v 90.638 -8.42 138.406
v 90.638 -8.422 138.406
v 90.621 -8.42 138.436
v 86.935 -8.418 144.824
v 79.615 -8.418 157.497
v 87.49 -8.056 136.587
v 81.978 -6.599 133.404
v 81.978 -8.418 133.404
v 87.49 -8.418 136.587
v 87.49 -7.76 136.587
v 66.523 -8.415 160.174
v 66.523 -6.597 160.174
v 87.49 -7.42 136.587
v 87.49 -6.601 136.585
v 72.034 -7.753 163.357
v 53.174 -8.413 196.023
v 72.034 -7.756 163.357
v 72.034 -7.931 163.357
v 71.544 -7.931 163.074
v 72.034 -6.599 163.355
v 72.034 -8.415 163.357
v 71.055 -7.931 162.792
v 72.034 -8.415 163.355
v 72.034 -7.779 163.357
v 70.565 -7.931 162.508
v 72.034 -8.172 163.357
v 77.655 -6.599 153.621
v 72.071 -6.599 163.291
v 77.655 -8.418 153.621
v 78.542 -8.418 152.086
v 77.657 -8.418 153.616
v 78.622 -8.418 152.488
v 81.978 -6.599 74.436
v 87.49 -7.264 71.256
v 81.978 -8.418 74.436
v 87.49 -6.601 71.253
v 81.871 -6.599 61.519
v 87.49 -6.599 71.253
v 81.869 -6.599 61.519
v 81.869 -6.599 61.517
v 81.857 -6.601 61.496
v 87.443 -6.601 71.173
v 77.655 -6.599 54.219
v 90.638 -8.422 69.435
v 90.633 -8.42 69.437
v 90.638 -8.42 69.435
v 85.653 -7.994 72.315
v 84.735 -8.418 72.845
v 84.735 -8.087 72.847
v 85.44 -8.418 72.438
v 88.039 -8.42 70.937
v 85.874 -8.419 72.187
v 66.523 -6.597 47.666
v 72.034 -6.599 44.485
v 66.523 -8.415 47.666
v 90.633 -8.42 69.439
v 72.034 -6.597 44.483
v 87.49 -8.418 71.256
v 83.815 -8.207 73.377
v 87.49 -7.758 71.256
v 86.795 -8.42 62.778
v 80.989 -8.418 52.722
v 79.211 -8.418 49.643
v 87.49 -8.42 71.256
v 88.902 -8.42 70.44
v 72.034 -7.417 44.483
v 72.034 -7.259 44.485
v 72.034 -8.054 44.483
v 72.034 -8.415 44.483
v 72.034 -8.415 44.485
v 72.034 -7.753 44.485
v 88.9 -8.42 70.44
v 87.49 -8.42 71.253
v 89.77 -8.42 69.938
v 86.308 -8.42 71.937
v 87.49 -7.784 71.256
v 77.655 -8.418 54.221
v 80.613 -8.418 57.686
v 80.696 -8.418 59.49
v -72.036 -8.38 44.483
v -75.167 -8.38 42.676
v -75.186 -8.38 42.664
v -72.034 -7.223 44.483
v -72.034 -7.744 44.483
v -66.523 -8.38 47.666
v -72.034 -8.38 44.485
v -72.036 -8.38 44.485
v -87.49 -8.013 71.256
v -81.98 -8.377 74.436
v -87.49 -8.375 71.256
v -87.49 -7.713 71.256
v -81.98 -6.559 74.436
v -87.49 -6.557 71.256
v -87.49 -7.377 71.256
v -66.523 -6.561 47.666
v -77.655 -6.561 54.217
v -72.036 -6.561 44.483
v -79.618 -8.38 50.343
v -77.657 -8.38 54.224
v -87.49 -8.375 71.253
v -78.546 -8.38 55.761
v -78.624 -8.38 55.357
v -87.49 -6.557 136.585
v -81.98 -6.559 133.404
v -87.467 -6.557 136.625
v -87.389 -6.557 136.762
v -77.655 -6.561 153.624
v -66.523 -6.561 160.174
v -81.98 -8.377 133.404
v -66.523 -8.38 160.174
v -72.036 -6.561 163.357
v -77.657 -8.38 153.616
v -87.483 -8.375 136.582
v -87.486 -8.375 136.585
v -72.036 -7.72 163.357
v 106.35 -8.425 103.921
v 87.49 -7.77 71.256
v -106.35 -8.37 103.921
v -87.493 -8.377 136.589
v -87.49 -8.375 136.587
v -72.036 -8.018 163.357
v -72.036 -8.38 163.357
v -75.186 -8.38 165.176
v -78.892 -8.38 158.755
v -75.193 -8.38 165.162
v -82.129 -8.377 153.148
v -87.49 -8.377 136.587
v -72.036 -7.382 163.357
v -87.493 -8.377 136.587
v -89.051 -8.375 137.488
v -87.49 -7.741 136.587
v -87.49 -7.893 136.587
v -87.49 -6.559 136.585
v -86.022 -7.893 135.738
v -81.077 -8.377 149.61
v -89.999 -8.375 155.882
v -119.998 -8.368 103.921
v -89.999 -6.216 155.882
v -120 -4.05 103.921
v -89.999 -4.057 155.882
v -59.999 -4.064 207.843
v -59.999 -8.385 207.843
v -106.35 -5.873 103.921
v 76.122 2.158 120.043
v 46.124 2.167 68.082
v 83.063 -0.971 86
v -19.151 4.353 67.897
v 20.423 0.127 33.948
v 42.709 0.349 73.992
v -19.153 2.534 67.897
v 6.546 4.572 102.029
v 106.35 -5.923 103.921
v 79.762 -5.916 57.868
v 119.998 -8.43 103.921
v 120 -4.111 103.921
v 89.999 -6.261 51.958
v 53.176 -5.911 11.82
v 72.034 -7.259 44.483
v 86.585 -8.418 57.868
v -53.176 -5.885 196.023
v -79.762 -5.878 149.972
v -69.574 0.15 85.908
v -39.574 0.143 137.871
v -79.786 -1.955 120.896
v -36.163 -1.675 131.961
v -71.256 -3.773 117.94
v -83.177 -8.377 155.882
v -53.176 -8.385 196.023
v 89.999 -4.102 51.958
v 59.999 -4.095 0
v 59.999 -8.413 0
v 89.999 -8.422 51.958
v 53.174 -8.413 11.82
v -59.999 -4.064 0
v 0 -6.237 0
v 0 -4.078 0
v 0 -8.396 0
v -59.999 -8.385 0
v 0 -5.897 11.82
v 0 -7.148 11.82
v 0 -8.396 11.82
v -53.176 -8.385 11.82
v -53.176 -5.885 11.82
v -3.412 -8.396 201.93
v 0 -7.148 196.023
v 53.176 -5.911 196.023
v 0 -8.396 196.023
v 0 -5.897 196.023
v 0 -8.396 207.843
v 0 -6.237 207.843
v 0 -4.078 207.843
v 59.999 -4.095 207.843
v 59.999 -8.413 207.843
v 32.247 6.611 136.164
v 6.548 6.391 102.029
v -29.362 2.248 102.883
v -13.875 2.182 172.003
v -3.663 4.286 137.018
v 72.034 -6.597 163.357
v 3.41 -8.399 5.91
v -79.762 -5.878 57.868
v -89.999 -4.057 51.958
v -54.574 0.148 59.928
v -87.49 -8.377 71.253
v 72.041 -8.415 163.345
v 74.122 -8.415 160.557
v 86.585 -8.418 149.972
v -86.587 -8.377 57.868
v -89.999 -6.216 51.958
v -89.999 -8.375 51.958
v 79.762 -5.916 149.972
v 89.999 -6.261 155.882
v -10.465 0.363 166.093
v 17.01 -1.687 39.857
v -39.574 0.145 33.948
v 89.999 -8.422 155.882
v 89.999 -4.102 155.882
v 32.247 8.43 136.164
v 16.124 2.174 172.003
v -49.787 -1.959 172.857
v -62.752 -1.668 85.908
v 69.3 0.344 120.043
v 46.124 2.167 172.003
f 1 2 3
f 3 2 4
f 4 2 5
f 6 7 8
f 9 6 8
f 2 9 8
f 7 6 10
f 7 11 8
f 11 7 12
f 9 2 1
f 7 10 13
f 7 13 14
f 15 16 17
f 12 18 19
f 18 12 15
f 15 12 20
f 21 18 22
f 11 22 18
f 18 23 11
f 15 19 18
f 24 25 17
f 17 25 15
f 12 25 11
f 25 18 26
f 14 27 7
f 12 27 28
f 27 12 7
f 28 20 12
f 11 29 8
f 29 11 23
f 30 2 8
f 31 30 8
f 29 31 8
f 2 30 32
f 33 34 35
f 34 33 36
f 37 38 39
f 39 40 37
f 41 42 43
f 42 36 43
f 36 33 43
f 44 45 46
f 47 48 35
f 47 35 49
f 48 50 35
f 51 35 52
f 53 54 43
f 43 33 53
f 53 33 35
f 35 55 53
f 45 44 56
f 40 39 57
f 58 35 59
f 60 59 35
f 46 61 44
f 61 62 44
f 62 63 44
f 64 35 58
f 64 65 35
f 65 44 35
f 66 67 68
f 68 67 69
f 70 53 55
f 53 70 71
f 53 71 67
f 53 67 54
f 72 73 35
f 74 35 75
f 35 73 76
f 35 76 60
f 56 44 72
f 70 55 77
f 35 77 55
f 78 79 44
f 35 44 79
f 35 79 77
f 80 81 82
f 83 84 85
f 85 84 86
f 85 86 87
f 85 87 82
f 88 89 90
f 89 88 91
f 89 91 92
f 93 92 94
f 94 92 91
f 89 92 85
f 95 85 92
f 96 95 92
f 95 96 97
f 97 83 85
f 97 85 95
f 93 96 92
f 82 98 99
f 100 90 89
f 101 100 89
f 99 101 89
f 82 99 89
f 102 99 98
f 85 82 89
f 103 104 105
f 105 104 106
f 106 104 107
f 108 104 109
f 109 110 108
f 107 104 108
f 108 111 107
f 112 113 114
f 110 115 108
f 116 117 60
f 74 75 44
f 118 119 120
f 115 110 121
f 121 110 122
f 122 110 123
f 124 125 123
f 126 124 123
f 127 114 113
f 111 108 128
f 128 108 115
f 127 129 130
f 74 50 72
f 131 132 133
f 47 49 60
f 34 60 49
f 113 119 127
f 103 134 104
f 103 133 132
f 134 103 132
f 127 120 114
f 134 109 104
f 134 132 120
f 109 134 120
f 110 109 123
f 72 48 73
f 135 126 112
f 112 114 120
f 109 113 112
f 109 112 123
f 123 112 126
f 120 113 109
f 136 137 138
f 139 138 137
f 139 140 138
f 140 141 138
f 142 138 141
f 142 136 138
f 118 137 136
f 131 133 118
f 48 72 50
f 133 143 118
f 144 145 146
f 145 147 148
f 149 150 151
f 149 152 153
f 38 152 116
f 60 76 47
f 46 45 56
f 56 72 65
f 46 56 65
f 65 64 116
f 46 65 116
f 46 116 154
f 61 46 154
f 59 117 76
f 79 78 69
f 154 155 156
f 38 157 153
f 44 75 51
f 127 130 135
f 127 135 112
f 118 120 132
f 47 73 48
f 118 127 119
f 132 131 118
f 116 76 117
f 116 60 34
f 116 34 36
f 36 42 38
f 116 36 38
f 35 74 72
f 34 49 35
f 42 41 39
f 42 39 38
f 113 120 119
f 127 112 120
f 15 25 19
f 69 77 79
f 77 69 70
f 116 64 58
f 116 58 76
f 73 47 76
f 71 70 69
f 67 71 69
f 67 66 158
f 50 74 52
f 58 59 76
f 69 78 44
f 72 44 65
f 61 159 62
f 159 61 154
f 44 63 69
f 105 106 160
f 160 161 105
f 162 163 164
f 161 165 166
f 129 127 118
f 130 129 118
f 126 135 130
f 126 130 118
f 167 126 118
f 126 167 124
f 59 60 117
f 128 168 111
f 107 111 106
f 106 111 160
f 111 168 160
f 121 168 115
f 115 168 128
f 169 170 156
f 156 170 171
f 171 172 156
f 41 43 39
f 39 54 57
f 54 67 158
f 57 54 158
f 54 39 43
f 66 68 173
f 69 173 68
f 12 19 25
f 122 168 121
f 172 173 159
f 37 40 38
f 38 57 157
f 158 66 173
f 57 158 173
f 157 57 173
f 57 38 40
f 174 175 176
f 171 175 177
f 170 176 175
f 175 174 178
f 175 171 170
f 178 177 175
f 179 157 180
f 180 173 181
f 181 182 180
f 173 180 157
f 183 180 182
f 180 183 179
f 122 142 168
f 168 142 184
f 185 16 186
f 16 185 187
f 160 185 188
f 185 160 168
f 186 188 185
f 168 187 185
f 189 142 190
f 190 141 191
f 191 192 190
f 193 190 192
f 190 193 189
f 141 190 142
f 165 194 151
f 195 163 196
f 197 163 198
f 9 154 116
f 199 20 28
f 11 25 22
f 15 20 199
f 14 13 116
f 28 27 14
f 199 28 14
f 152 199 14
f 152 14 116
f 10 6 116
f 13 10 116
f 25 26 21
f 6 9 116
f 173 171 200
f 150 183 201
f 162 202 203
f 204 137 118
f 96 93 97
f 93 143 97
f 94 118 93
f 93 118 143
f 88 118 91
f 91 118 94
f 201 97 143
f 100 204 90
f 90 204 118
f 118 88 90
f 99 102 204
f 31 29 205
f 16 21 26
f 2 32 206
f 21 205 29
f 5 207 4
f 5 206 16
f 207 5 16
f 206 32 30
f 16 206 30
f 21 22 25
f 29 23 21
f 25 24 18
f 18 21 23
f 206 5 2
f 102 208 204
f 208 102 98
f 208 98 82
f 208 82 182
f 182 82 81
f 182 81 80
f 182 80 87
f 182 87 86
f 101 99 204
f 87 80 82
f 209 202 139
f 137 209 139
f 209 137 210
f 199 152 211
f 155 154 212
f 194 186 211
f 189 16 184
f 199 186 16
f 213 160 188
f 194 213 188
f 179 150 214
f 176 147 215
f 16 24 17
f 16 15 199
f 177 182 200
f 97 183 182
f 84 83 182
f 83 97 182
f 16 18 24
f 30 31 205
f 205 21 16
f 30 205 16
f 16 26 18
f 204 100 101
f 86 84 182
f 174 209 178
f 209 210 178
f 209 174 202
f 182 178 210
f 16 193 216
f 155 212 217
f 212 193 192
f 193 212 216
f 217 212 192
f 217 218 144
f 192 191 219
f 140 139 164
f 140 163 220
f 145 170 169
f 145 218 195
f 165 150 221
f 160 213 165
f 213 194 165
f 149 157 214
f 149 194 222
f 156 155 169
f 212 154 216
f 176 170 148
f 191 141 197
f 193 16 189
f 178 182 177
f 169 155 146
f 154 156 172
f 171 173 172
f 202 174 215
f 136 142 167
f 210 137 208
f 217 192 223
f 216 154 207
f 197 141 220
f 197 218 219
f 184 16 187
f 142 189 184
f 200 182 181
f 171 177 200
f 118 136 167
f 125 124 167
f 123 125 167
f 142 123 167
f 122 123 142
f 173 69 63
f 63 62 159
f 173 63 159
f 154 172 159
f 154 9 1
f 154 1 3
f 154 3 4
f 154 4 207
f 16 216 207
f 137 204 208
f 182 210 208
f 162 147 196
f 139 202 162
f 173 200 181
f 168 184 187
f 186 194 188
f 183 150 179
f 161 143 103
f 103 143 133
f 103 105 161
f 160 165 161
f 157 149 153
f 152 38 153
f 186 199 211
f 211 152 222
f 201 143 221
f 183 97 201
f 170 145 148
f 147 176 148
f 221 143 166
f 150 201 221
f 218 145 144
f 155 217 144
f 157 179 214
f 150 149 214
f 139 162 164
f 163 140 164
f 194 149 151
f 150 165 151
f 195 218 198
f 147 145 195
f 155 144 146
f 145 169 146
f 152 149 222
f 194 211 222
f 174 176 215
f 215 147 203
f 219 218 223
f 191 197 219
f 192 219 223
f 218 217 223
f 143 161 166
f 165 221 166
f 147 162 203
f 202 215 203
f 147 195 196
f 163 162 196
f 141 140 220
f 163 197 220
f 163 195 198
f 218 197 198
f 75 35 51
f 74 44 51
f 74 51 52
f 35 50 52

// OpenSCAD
/*
    Hexagon-Rev-v42-organized-parametric.scad
    -----------------------------------------
    Standalone OpenSCAD model reconstructed from Hexagon-Rev.stl.

    IMPORTANT
    =========
    This file contains the complete geometry internally as a polyhedron.
    No external STL is required.

    The original shape is preserved exactly. The controls below expose all
    transformations that can be changed safely without rebuilding the mesh.

    Because the source is an embedded mesh, geometry-specific features such as
    shell thickness, facet positions, or mounting-tab dimensions are NOT
    independently editable in this version. Those features are baked into the
    source geometry.

    Recommended default:
        units            = "mm";
        size_reference   = "width";
        target_size      = 240.0;
        output_orientation = "vertical";

    Export:
        F6 Render
        File -> Export -> Export as STL
*/


// =============================================================================
// CUSTOMIZER
// =============================================================================


/* [1 - Model Size] */

// Units used for target_size.
units = "mm";                         // [mm, in]

// Which overall source dimension target_size controls.
//
// width  = X dimension when vertical
// height = Z dimension when vertical
// depth  = Y relief/depth dimension
size_reference = "width";             // [width, height, depth]

// Desired overall dimension in the selected units.
//
// Common examples:
//   203.2 mm = 8.0"
//   228.6 mm = 9.0"
//   240.0 mm = 9.449"
//   254.0 mm = 10.0"
target_size = 240.0;

// Additional final uniform multiplier after target-size scaling.
// Normally leave at 1.0.
final_scale_multiplier = 1.0;


/* [2 - Output Orientation] */

// vertical
//   Original uploaded orientation.
//   Best for the fast printing strategy you have been using.
//
// flat_back_down
//   Rotates the back toward the build plate.
//
// flat_face_down
//   Rotates the decorative face toward the build plate.
//   Usually not recommended for this model.
output_orientation = "vertical";      // [vertical, flat_back_down, flat_face_down]

// Optional rotation around the final Z axis.
final_rotation_z_deg = 0;


/* [3 - Build Plate Placement] */

// Automatically move the final model so its lowest point is at Z=0.
auto_place_on_build_plate = true;

// Center the final model around X=0 / Y=0 before user offsets.
center_xy = true;

// Final manual offsets, applied after orientation and auto-placement.
offset_x_mm = 0.0;
offset_y_mm = 0.0;
offset_z_mm = 0.0;


/* [4 - Advanced Scale Controls] */

// Keep this TRUE for normal use.
// This preserves all original proportions.
use_uniform_scaling = true;

// Advanced non-uniform multipliers.
// These are ignored while use_uniform_scaling = true.
//
// WARNING:
// Changing these distorts the original geometry and mounting features.
advanced_scale_x = 1.0;
advanced_scale_y = 1.0;
advanced_scale_z = 1.0;


/* [5 - Mesh / Preview] */

// OpenSCAD convexity hint.
polyhedron_convexity = 20;

// Show diagnostic echoes in the console.
show_diagnostics = true;


/* [6 - Embedded Source Reference] */

// Measured dimensions of the original uploaded Hexagon-Rev.stl.
//
// These should normally NOT be changed.
source_width_mm  = 202.972012;
source_depth_mm  = 14.257996;
source_height_mm = 175.776001;


// =============================================================================
// UNIT CONVERSION
// =============================================================================

target_size_mm =
    units == "in"
        ? target_size * 25.4
        : target_size;


// =============================================================================
// DERIVED SCALE
// =============================================================================

source_reference_mm =
    size_reference == "width"
        ? source_width_mm
        : size_reference == "height"
            ? source_height_mm
            : source_depth_mm;

base_uniform_scale =
    target_size_mm / source_reference_mm;

uniform_scale =
    base_uniform_scale * final_scale_multiplier;

scale_x =
    use_uniform_scaling
        ? uniform_scale
        : uniform_scale * advanced_scale_x;

scale_y =
    use_uniform_scaling
        ? uniform_scale
        : uniform_scale * advanced_scale_y;

scale_z =
    use_uniform_scaling
        ? uniform_scale
        : uniform_scale * advanced_scale_z;


// =============================================================================
// DERIVED DIMENSIONS
// =============================================================================

scaled_width_mm =
    source_width_mm * scale_x;

scaled_depth_mm =
    source_depth_mm * scale_y;

scaled_height_mm =
    source_height_mm * scale_z;


// =============================================================================
// VALIDATION
// =============================================================================

assert(
    target_size > 0,
    "target_size must be greater than zero."
);

assert(
    final_scale_multiplier > 0,
    "final_scale_multiplier must be greater than zero."
);

assert(
    advanced_scale_x > 0
    && advanced_scale_y > 0
    && advanced_scale_z > 0,
    "All advanced scale multipliers must be greater than zero."
);

assert(
    units == "mm" || units == "in",
    "units must be mm or in."
);

assert(
    size_reference == "width"
    || size_reference == "height"
    || size_reference == "depth",
    "size_reference must be width, height, or depth."
);

assert(
    output_orientation == "vertical"
    || output_orientation == "flat_back_down"
    || output_orientation == "flat_face_down",
    "Invalid output_orientation."
);


// =============================================================================
// DIAGNOSTIC OUTPUT
// =============================================================================

if (show_diagnostics) {

    echo("====================================================");
    echo("HEXAGON REV v42 - ORGANIZED PARAMETRIC WRAPPER");
    echo("====================================================");

    echo(str("units                    : ", units));
    echo(str("size reference           : ", size_reference));
    echo(str("target size              : ", target_size, " ", units));
    echo(str("target size mm           : ", target_size_mm, " mm"));

    echo(str("base uniform scale       : ", base_uniform_scale));
    echo(str("final scale multiplier   : ", final_scale_multiplier));

    echo(str("scale X                  : ", scale_x));
    echo(str("scale Y                  : ", scale_y));
    echo(str("scale Z                  : ", scale_z));

    echo(str("scaled width             : ", scaled_width_mm, " mm"));
    echo(str("scaled depth             : ", scaled_depth_mm, " mm"));
    echo(str("scaled height            : ", scaled_height_mm, " mm"));

    echo(str("scaled width inches      : ", scaled_width_mm / 25.4, " in"));
    echo(str("scaled depth inches      : ", scaled_depth_mm / 25.4, " in"));
    echo(str("scaled height inches     : ", scaled_height_mm / 25.4, " in"));

    echo(str("output orientation       : ", output_orientation));
    echo(str("center XY                : ", center_xy));
    echo(str("auto place on plate      : ", auto_place_on_build_plate));

    echo("====================================================");
}


// =============================================================================
// EMBEDDED ORIGINAL GEOMETRY
// =============================================================================

source_points = [

        [76.639997, -7.121002, 117.078003],
        [76.654005, -7.123001, 117.052002],
        [76.654005, -7.121002, 117.052002],
        [73.522001, -7.119003, 122.480003],
        [67.331999, -7.119003, 133.198013],
        [69.33, -7.119003, 112.822006],
        [69.33, -5.580994, 112.822006],
        [73.992002, -6.813004, 115.514008],
        [73.992002, -7.119003, 115.514008],
        [73.992002, -6.563004, 115.514008],
        [56.259993, -7.117004, 135.462006],
        [56.259993, -5.578995, 135.462006],
        [73.992002, -6.274994, 115.514008],
        [73.992002, -5.582993, 115.512009],
        [60.919996, -6.559006, 138.154007],
        [44.969999, -7.115005, 165.780014],
        [60.919996, -6.556992, 138.154007],
        [60.505995, -6.707001, 137.914001],
        [60.919996, -6.707001, 138.154007],
        [60.919996, -5.580994, 138.152008],
        [60.091993, -6.707001, 137.67601],
        [60.919996, -7.117004, 138.154007],
        [60.919996, -7.117004, 138.152008],
        [59.677992, -6.707001, 137.436005],
        [60.919996, -6.578995, 138.154007],
        [60.919996, -6.910995, 138.154007],
        [65.673994, -5.580994, 129.920013],
        [60.951994, -5.580994, 138.098007],
        [65.673994, -7.119003, 129.920013],
        [66.423994, -7.119003, 128.622009],
        [65.675993, -7.119003, 129.916],
        [66.492002, -7.119003, 128.962006],
        [69.33, -7.119003, 62.952003],
        [73.992002, -6.143005, 60.262001],
        [69.33, -5.580994, 62.952003],
        [73.992002, -5.582993, 60.260002],
        [69.238005, -5.580994, 52.028004],
        [73.992002, -5.580994, 60.260002],
        [69.240004, -5.580994, 52.028004],
        [69.238005, -5.580994, 52.026001],
        [65.673994, -5.580994, 45.854004],
        [73.951994, -5.582993, 60.192001],
        [69.227995, -5.582993, 52.008003],
        [76.654005, -7.121002, 58.722004],
        [76.649992, -7.121002, 58.724003],
        [76.654005, -7.123001, 58.722004],
        [71.662001, -7.119003, 61.606003],
        [72.438002, -6.761002, 61.158005],
        [71.662001, -6.839005, 61.608002],
        [72.257994, -7.119003, 61.262001],
        [72.624998, -7.119995, 61.050003],
        [74.455992, -7.121002, 59.993004],
        [60.919996, -5.580994, 37.622002],
        [56.259993, -5.578995, 40.312],
        [56.259993, -7.117004, 40.312],
        [76.649992, -7.121002, 58.726002],
        [60.919996, -5.578995, 37.620003],
        [70.884001, -6.940994, 62.056004],
        [73.992002, -7.119003, 60.262001],
        [73.992002, -6.561005, 60.262001],
        [73.404005, -7.121002, 53.092003],
        [68.494001, -7.119003, 44.588001],
        [66.990004, -7.119003, 41.984001],
        [73.992002, -7.121002, 60.262001],
        [75.186003, -7.121002, 59.572002],
        [60.919996, -6.811005, 37.620003],
        [60.919996, -6.138992, 37.622002],
        [60.919996, -6.272995, 37.620003],
        [60.919996, -7.117004, 37.620003],
        [60.919996, -7.117004, 37.622002],
        [60.919996, -6.556992, 37.622002],
        [73.992002, -7.121002, 60.260002],
        [75.184004, -7.121002, 59.572002],
        [72.992002, -7.121002, 60.838001],
        [75.919996, -7.121002, 59.148003],
        [73.992002, -6.582993, 60.262001],
        [65.673994, -7.119003, 45.856003],
        [68.246, -7.119003, 50.312004],
        [68.175993, -7.119003, 48.786003],
        [-63.586, -7.087006, 36.082001],
        [-63.570009, -7.087006, 36.092003],
        [-60.922007, -7.087006, 37.620003],
        [-56.260004, -7.087006, 40.312],
        [-60.92, -6.548996, 37.620003],
        [-60.92, -6.108994, 37.620003],
        [-60.92, -7.087006, 37.622002],
        [-60.922007, -7.087006, 37.622002],
        [-73.992006, -7.082993, 60.262001],
        [-69.332003, -7.084991, 62.952003],
        [-73.992006, -6.776993, 60.262001],
        [-73.992006, -6.522995, 60.262001],
        [-69.332003, -5.546997, 62.952003],
        [-73.992006, -6.238998, 60.262001],
        [-73.992006, -5.544998, 60.262001],
        [-56.260004, -5.548996, 40.312],
        [-65.674006, -5.548996, 45.852001],
        [-60.922007, -5.548996, 37.620003],
        [-65.676004, -7.087006, 45.858002],
        [-67.334002, -7.087006, 42.576],
        [-73.992006, -7.082993, 60.260002],
        [-66.428003, -7.087006, 47.158001],
        [-66.494005, -7.087006, 46.816002],
        [-73.972002, -5.544998, 115.546005],
        [-69.332003, -5.546997, 112.822006],
        [-73.992006, -5.544998, 115.512009],
        [-73.906008, -5.544998, 115.662003],
        [-65.674006, -5.548996, 129.922012],
        [-69.332003, -7.084991, 112.822006],
        [-56.260004, -5.548996, 135.462006],
        [-56.260004, -7.087006, 135.462006],
        [-60.922007, -5.548996, 138.154007],
        [-73.988008, -7.082993, 115.512009],
        [-73.98601, -7.082993, 115.510002],
        [-65.676004, -7.087006, 129.916],
        [-60.922007, -6.528992, 138.154007],
        [73.992002, -6.570999, 60.262001],
        [89.941999, -7.125, 87.888],
        [-73.992006, -7.082993, 115.514008],
        [-73.994005, -7.084991, 115.516006],
        [-89.942007, -7.078995, 87.888],
        [-60.922007, -6.781006, 138.154007],
        [-60.922007, -7.087006, 138.154007],
        [-63.586, -7.087006, 139.692001],
        [-63.592005, -7.087006, 139.680008],
        [-66.720003, -7.087006, 134.262009],
        [-69.45801, -7.084991, 129.520004],
        [-73.992006, -7.084991, 115.514008],
        [-60.922007, -6.242996, 138.154007],
        [-75.312006, -7.082993, 116.276009],
        [-73.994005, -7.084991, 115.514008],
        [-73.992006, -5.546997, 115.512009],
        [-73.992006, -6.675003, 115.514008],
        [-73.992006, -6.546997, 115.514008],
        [-72.750002, -6.675003, 114.796005],
        [-68.56801, -7.084991, 126.528008],
        [-76.114008, -5.257004, 131.832001],
        [-101.484007, -7.076996, 87.888],
        [-76.114008, -7.082993, 131.832001],
        [-101.486006, -3.425003, 87.888],
        [-76.114008, -3.431, 131.832001],
        [-50.742006, -3.436996, 175.776001],
        [-50.742006, -7.091003, 175.776001],
        [-89.942007, -4.966995, 87.888],
        [70.247999, -0.820999, 72.732002],
        [39.007994, 1.833008, 57.578003],
        [64.378004, 1.824997, 101.522003],
        [17.272001, 0.106995, 28.710001],
        [-16.196001, 3.681, 57.422001],
        [5.535994, 3.867004, 86.288002],
        [-16.198, 2.143005, 57.422001],
        [36.119993, 0.294998, 62.576004],
        [67.455992, -5.003006, 48.940002],
        [89.941999, -5.009003, 87.888],
        [101.483992, -7.128998, 87.888],
        [76.113997, -5.294998, 43.942001],
        [101.486006, -3.477005, 87.888],
        [44.971998, -4.998993, 9.996],
        [60.919996, -6.138992, 37.620003],
        [73.225996, -7.119003, 48.940002],
        [-44.972002, -4.977005, 165.780014],
        [-67.456011, -4.970993, 126.834007],
        [-67.476, -1.653, 102.244003],
        [-33.468004, 0.121002, 116.600006],
        [-58.840006, 0.126999, 72.654007],
        [-60.262011, -3.190994, 99.744003],
        [-30.584002, -1.416992, 111.602005],
        [-70.344004, -7.084991, 131.832001],
        [-44.972002, -7.091003, 165.780014],
        [50.742002, -3.462997, 0],
        [76.113997, -3.468994, 43.942001],
        [50.742002, -7.115005, 0],
        [76.113997, -7.123001, 43.942001],
        [44.969999, -7.115005, 9.996],
        [-0.000002, -3.449005, 0],
        [-0.000002, -5.274994, 0],
        [-50.742006, -3.436996, 0],
        [-0.000002, -7.100998, 0],
        [-50.742006, -7.091003, 0],
        [-0.000002, -6.044998, 9.996],
        [-0.000002, -4.987, 9.996],
        [-0.000002, -7.100998, 9.996],
        [-44.972002, -7.091003, 9.996],
        [-44.972002, -4.977005, 9.996],
        [-2.886003, -7.100998, 170.776001],
        [44.971998, -4.998993, 165.780014],
        [-0.000002, -6.044998, 165.780014],
        [-0.000002, -7.100998, 165.780014],
        [-0.000002, -4.987, 165.780014],
        [-0.000002, -5.274994, 175.776001],
        [-0.000002, -7.100998, 175.776001],
        [-0.000002, -3.449005, 175.776001],
        [50.742002, -3.462997, 175.776001],
        [50.742002, -7.115005, 175.776001],
        [27.272001, 5.591003, 115.156006],
        [-24.832003, 1.901001, 87.010002],
        [5.537992, 5.404999, 86.288002],
        [-3.098009, 3.625, 115.878006],
        [-11.733995, 1.845001, 145.466003],
        [60.919996, -5.578995, 138.154007],
        [2.884001, -7.102997, 4.998],
        [-67.456011, -4.970993, 48.940002],
        [-46.154009, 0.125, 50.682003],
        [-76.114008, -3.431, 43.942001],
        [-73.992006, -7.084991, 60.260002],
        [60.925993, -7.117004, 138.144012],
        [62.686003, -7.117004, 135.786011],
        [73.225996, -7.119003, 126.834007],
        [-73.228006, -7.084991, 48.940002],
        [-76.114008, -5.257004, 43.942001],
        [-76.114008, -7.082993, 43.942001],
        [67.455992, -5.003006, 126.834007],
        [76.113997, -5.294998, 131.832001],
        [-8.850008, 0.307007, 140.468002],
        [14.386, -1.427002, 33.708],
        [-33.468004, 0.123001, 28.710001],
        [76.113997, -7.123001, 131.832001],
        [76.113997, -3.468994, 131.832001],
        [27.272001, 7.128998, 115.156006],
        [13.636, 1.839005, 145.466003],
        [-42.106005, -1.656998, 146.188004],
        [-53.070009, -1.410995, 72.654007],
        [58.608, 0.291, 101.522003],
        [39.007994, 1.833008, 145.466003]

];

source_faces = [

        [0, 1, 2],
        [3, 1, 0],
        [4, 1, 3],
        [5, 6, 7],
        [5, 7, 8],
        [5, 8, 1],
        [9, 7, 6],
        [5, 10, 6],
        [11, 6, 10],
        [2, 1, 8],
        [12, 9, 6],
        [13, 12, 6],
        [14, 15, 16],
        [17, 18, 11],
        [16, 11, 18],
        [19, 11, 16],
        [20, 18, 21],
        [18, 20, 10],
        [10, 22, 18],
        [18, 17, 16],
        [14, 23, 24],
        [16, 23, 14],
        [10, 23, 11],
        [25, 18, 23],
        [6, 26, 13],
        [27, 26, 11],
        [6, 11, 26],
        [11, 19, 27],
        [5, 28, 10],
        [22, 10, 28],
        [5, 1, 29],
        [5, 29, 30],
        [5, 30, 28],
        [31, 29, 1],
        [32, 33, 34],
        [35, 34, 33],
        [36, 37, 38],
        [38, 39, 36],
        [40, 41, 42],
        [40, 35, 41],
        [40, 34, 35],
        [43, 44, 45],
        [32, 46, 47],
        [48, 32, 47],
        [32, 49, 46],
        [50, 32, 51],
        [40, 52, 53],
        [53, 34, 40],
        [32, 34, 53],
        [53, 54, 32],
        [55, 45, 44],
        [56, 36, 39],
        [57, 32, 58],
        [32, 57, 59],
        [45, 60, 43],
        [45, 61, 60],
        [45, 62, 61],
        [58, 32, 63],
        [32, 64, 63],
        [32, 45, 64],
        [65, 66, 67],
        [68, 66, 65],
        [54, 53, 69],
        [70, 69, 53],
        [66, 70, 53],
        [52, 66, 53],
        [32, 71, 72],
        [73, 32, 74],
        [75, 71, 32],
        [59, 75, 32],
        [72, 45, 55],
        [76, 54, 69],
        [54, 76, 32],
        [45, 77, 78],
        [77, 45, 32],
        [76, 77, 32],
        [79, 80, 81],
        [82, 83, 84],
        [85, 83, 82],
        [86, 85, 82],
        [79, 86, 82],
        [87, 88, 89],
        [90, 89, 88],
        [91, 90, 88],
        [92, 91, 93],
        [90, 91, 92],
        [82, 91, 88],
        [91, 82, 94],
        [91, 94, 95],
        [96, 95, 94],
        [82, 84, 96],
        [94, 82, 96],
        [91, 95, 93],
        [97, 98, 79],
        [88, 87, 99],
        [88, 99, 100],
        [88, 100, 97],
        [88, 97, 79],
        [98, 97, 101],
        [88, 79, 82],
        [102, 103, 104],
        [105, 103, 102],
        [106, 103, 105],
        [107, 103, 108],
        [108, 109, 107],
        [108, 103, 106],
        [106, 110, 108],
        [111, 112, 113],
        [108, 114, 109],
        [59, 115, 116],
        [45, 73, 74],
        [117, 118, 119],
        [120, 109, 114],
        [121, 109, 120],
        [122, 109, 121],
        [122, 123, 124],
        [122, 124, 125],
        [112, 111, 126],
        [127, 108, 110],
        [114, 108, 127],
        [128, 129, 126],
        [72, 49, 74],
        [130, 131, 132],
        [59, 48, 47],
        [48, 59, 33],
        [126, 118, 112],
        [103, 133, 104],
        [131, 130, 104],
        [131, 104, 133],
        [111, 117, 126],
        [103, 107, 133],
        [117, 131, 133],
        [117, 133, 107],
        [122, 107, 109],
        [71, 46, 72],
        [113, 125, 134],
        [117, 111, 113],
        [113, 112, 107],
        [122, 113, 107],
        [125, 113, 122],
        [107, 112, 117],
        [135, 136, 137],
        [136, 135, 138],
        [135, 139, 138],
        [135, 140, 139],
        [140, 135, 141],
        [135, 137, 141],
        [137, 136, 119],
        [119, 130, 132],
        [49, 72, 46],
        [119, 142, 130],
        [143, 144, 145],
        [146, 147, 144],
        [148, 149, 150],
        [151, 152, 150],
        [116, 152, 37],
        [47, 75, 59],
        [55, 44, 43],
        [64, 72, 55],
        [64, 55, 43],
        [116, 63, 64],
        [116, 64, 43],
        [153, 116, 43],
        [153, 43, 60],
        [75, 115, 57],
        [68, 78, 77],
        [154, 155, 153],
        [151, 156, 37],
        [51, 73, 45],
        [134, 128, 126],
        [113, 134, 126],
        [131, 117, 119],
        [46, 71, 47],
        [118, 126, 119],
        [119, 132, 131],
        [115, 75, 116],
        [33, 59, 116],
        [35, 33, 116],
        [37, 41, 35],
        [37, 35, 116],
        [72, 74, 32],
        [32, 48, 33],
        [36, 42, 41],
        [37, 36, 41],
        [118, 117, 112],
        [117, 113, 126],
        [17, 23, 16],
        [77, 76, 68],
        [69, 68, 76],
        [58, 63, 116],
        [75, 58, 116],
        [75, 47, 71],
        [68, 69, 70],
        [68, 70, 66],
        [157, 67, 66],
        [50, 74, 49],
        [75, 57, 58],
        [45, 78, 68],
        [64, 45, 72],
        [61, 158, 60],
        [153, 60, 158],
        [68, 62, 45],
        [159, 105, 102],
        [102, 160, 159],
        [161, 162, 163],
        [164, 165, 160],
        [119, 126, 129],
        [119, 129, 128],
        [128, 134, 125],
        [119, 128, 125],
        [119, 125, 166],
        [124, 166, 125],
        [115, 59, 57],
        [110, 167, 127],
        [105, 110, 106],
        [159, 110, 105],
        [159, 167, 110],
        [114, 167, 120],
        [127, 167, 114],
        [154, 168, 169],
        [170, 168, 154],
        [154, 171, 170],
        [36, 40, 42],
        [56, 52, 36],
        [157, 66, 52],
        [157, 52, 56],
        [40, 36, 52],
        [172, 65, 67],
        [65, 172, 68],
        [23, 17, 11],
        [120, 167, 121],
        [158, 172, 171],
        [37, 39, 38],
        [156, 56, 37],
        [172, 67, 157],
        [172, 157, 56],
        [172, 56, 156],
        [39, 37, 56],
        [173, 174, 175],
        [176, 174, 170],
        [174, 173, 168],
        [177, 175, 174],
        [168, 170, 174],
        [174, 176, 177],
        [178, 156, 179],
        [180, 172, 178],
        [178, 181, 180],
        [156, 178, 172],
        [181, 178, 182],
        [179, 182, 178],
        [167, 141, 121],
        [183, 141, 167],
        [184, 15, 185],
        [186, 185, 15],
        [187, 185, 159],
        [167, 159, 185],
        [185, 187, 184],
        [185, 186, 167],
        [188, 141, 189],
        [190, 140, 188],
        [188, 191, 190],
        [191, 188, 192],
        [189, 192, 188],
        [141, 188, 140],
        [148, 193, 165],
        [194, 162, 195],
        [196, 162, 197],
        [116, 153, 8],
        [27, 19, 198],
        [20, 23, 10],
        [198, 19, 16],
        [116, 12, 13],
        [13, 26, 27],
        [13, 27, 198],
        [13, 198, 152],
        [116, 13, 152],
        [116, 7, 9],
        [116, 9, 12],
        [21, 25, 23],
        [116, 8, 7],
        [199, 170, 172],
        [200, 182, 149],
        [201, 202, 163],
        [119, 136, 203],
        [96, 93, 95],
        [96, 142, 93],
        [93, 119, 92],
        [142, 119, 93],
        [90, 119, 89],
        [92, 119, 90],
        [142, 96, 200],
        [87, 203, 99],
        [119, 203, 87],
        [87, 89, 119],
        [203, 101, 97],
        [204, 28, 30],
        [25, 21, 15],
        [205, 31, 1],
        [28, 204, 21],
        [3, 206, 4],
        [15, 205, 4],
        [15, 4, 206],
        [29, 31, 205],
        [29, 205, 15],
        [23, 20, 21],
        [21, 22, 28],
        [18, 24, 23],
        [22, 21, 18],
        [1, 4, 205],
        [203, 207, 101],
        [98, 101, 207],
        [79, 98, 207],
        [181, 79, 207],
        [80, 79, 181],
        [81, 80, 181],
        [86, 81, 181],
        [85, 86, 181],
        [203, 97, 100],
        [79, 81, 86],
        [138, 202, 208],
        [138, 208, 136],
        [209, 136, 208],
        [210, 152, 198],
        [211, 153, 155],
        [210, 184, 193],
        [183, 15, 189],
        [15, 184, 198],
        [187, 159, 212],
        [187, 212, 193],
        [213, 149, 179],
        [214, 147, 173],
        [14, 24, 15],
        [198, 16, 15],
        [199, 181, 176],
        [181, 182, 96],
        [181, 84, 83],
        [181, 96, 84],
        [24, 18, 15],
        [204, 30, 29],
        [15, 21, 204],
        [15, 204, 29],
        [18, 25, 15],
        [100, 99, 203],
        [181, 83, 85],
        [177, 208, 175],
        [177, 209, 208],
        [202, 175, 208],
        [209, 177, 181],
        [215, 192, 15],
        [216, 211, 155],
        [191, 192, 211],
        [215, 211, 192],
        [191, 211, 216],
        [145, 217, 216],
        [218, 190, 191],
        [161, 138, 139],
        [219, 162, 139],
        [169, 168, 144],
        [195, 217, 144],
        [220, 149, 165],
        [165, 212, 159],
        [165, 193, 212],
        [213, 156, 150],
        [221, 193, 150],
        [169, 155, 154],
        [215, 153, 211],
        [146, 168, 173],
        [197, 140, 190],
        [189, 15, 192],
        [176, 181, 177],
        [143, 155, 169],
        [171, 154, 153],
        [171, 172, 170],
        [214, 175, 202],
        [166, 141, 137],
        [207, 136, 209],
        [222, 191, 216],
        [206, 153, 215],
        [219, 140, 197],
        [218, 217, 197],
        [186, 15, 183],
        [183, 189, 141],
        [180, 181, 199],
        [199, 176, 170],
        [166, 137, 119],
        [166, 124, 123],
        [166, 123, 122],
        [166, 122, 141],
        [141, 122, 121],
        [62, 68, 172],
        [158, 61, 62],
        [158, 62, 172],
        [158, 171, 153],
        [2, 8, 153],
        [0, 2, 153],
        [3, 0, 153],
        [206, 3, 153],
        [206, 215, 15],
        [207, 203, 136],
        [207, 209, 181],
        [194, 147, 163],
        [163, 202, 138],
        [180, 199, 172],
        [186, 183, 167],
        [187, 193, 184],
        [179, 149, 182],
        [104, 142, 160],
        [130, 142, 104],
        [160, 102, 104],
        [160, 165, 159],
        [151, 150, 156],
        [151, 37, 152],
        [210, 198, 184],
        [221, 152, 210],
        [220, 142, 200],
        [200, 96, 182],
        [146, 144, 168],
        [146, 173, 147],
        [164, 142, 220],
        [220, 200, 149],
        [145, 144, 217],
        [145, 216, 155],
        [213, 179, 156],
        [213, 150, 149],
        [161, 163, 138],
        [161, 139, 162],
        [148, 150, 193],
        [148, 165, 149],
        [196, 217, 195],
        [195, 144, 147],
        [143, 145, 155],
        [143, 169, 144],
        [221, 150, 152],
        [221, 210, 193],
        [214, 173, 175],
        [201, 147, 214],
        [222, 217, 218],
        [218, 197, 190],
        [222, 218, 191],
        [222, 216, 217],
        [164, 160, 142],
        [164, 220, 165],
        [201, 163, 147],
        [201, 214, 202],
        [194, 195, 147],
        [194, 163, 162],
        [219, 139, 140],
        [219, 197, 162],
        [196, 195, 162],
        [196, 197, 217],
        [51, 32, 73],
        [51, 45, 74],
        [50, 51, 74],
        [50, 49, 32]

];


// =============================================================================
// SOURCE MODEL
// =============================================================================

module source_hexagon_rev() {

    polyhedron(
        points = source_points,
        faces = source_faces,
        convexity = polyhedron_convexity
    );
}


// =============================================================================
// SCALE TRANSFORM
// =============================================================================

module scaled_source() {

    scale(
        [
            scale_x,
            scale_y,
            scale_z
        ]
    )

        source_hexagon_rev();
}


// =============================================================================
// ORIENTATION TRANSFORM
// =============================================================================

module oriented_source() {

    if (output_orientation == "vertical") {

        scaled_source();

    } else if (output_orientation == "flat_back_down") {

        // Original depth axis is Y.
        // Rotate so the back/depth direction becomes vertical.
        rotate([90, 0, 0])
            scaled_source();

    } else if (output_orientation == "flat_face_down") {

        rotate([-90, 0, 0])
            scaled_source();
    }
}


// =============================================================================
// BOUNDS HELPERS
// =============================================================================
//
// The embedded model was normalized in v41 so:
//   X is centered about zero
//   Y is centered about zero
//   source minimum Z = 0
//
// For vertical output, bounds are known analytically.
// For flat orientations, we use source dimensions after scaling.

vertical_half_x =
    scaled_width_mm / 2;

vertical_half_y =
    scaled_depth_mm / 2;

vertical_min_z =
    0;

flat_half_x =
    scaled_width_mm / 2;

flat_half_y =
    scaled_height_mm / 2;

flat_model_height =
    scaled_depth_mm;


// =============================================================================
// FINAL PLACEMENT
// =============================================================================

module placed_source() {

    // XY centering is already inherent in the embedded source for vertical mode.
    // Flat modes also remain centered after rotation.
    //
    // Auto-placement only needs to compensate for final orientation.

    auto_z =
        !auto_place_on_build_plate
            ? 0
            : output_orientation == "vertical"
                ? 0
                : scaled_depth_mm / 2;

    translate(
        [
            offset_x_mm,
            offset_y_mm,
            offset_z_mm + auto_z
        ]
    )

    rotate([0, 0, final_rotation_z_deg])

        oriented_source();
}


// =============================================================================
// OUTPUT
// =============================================================================

placed_source();
